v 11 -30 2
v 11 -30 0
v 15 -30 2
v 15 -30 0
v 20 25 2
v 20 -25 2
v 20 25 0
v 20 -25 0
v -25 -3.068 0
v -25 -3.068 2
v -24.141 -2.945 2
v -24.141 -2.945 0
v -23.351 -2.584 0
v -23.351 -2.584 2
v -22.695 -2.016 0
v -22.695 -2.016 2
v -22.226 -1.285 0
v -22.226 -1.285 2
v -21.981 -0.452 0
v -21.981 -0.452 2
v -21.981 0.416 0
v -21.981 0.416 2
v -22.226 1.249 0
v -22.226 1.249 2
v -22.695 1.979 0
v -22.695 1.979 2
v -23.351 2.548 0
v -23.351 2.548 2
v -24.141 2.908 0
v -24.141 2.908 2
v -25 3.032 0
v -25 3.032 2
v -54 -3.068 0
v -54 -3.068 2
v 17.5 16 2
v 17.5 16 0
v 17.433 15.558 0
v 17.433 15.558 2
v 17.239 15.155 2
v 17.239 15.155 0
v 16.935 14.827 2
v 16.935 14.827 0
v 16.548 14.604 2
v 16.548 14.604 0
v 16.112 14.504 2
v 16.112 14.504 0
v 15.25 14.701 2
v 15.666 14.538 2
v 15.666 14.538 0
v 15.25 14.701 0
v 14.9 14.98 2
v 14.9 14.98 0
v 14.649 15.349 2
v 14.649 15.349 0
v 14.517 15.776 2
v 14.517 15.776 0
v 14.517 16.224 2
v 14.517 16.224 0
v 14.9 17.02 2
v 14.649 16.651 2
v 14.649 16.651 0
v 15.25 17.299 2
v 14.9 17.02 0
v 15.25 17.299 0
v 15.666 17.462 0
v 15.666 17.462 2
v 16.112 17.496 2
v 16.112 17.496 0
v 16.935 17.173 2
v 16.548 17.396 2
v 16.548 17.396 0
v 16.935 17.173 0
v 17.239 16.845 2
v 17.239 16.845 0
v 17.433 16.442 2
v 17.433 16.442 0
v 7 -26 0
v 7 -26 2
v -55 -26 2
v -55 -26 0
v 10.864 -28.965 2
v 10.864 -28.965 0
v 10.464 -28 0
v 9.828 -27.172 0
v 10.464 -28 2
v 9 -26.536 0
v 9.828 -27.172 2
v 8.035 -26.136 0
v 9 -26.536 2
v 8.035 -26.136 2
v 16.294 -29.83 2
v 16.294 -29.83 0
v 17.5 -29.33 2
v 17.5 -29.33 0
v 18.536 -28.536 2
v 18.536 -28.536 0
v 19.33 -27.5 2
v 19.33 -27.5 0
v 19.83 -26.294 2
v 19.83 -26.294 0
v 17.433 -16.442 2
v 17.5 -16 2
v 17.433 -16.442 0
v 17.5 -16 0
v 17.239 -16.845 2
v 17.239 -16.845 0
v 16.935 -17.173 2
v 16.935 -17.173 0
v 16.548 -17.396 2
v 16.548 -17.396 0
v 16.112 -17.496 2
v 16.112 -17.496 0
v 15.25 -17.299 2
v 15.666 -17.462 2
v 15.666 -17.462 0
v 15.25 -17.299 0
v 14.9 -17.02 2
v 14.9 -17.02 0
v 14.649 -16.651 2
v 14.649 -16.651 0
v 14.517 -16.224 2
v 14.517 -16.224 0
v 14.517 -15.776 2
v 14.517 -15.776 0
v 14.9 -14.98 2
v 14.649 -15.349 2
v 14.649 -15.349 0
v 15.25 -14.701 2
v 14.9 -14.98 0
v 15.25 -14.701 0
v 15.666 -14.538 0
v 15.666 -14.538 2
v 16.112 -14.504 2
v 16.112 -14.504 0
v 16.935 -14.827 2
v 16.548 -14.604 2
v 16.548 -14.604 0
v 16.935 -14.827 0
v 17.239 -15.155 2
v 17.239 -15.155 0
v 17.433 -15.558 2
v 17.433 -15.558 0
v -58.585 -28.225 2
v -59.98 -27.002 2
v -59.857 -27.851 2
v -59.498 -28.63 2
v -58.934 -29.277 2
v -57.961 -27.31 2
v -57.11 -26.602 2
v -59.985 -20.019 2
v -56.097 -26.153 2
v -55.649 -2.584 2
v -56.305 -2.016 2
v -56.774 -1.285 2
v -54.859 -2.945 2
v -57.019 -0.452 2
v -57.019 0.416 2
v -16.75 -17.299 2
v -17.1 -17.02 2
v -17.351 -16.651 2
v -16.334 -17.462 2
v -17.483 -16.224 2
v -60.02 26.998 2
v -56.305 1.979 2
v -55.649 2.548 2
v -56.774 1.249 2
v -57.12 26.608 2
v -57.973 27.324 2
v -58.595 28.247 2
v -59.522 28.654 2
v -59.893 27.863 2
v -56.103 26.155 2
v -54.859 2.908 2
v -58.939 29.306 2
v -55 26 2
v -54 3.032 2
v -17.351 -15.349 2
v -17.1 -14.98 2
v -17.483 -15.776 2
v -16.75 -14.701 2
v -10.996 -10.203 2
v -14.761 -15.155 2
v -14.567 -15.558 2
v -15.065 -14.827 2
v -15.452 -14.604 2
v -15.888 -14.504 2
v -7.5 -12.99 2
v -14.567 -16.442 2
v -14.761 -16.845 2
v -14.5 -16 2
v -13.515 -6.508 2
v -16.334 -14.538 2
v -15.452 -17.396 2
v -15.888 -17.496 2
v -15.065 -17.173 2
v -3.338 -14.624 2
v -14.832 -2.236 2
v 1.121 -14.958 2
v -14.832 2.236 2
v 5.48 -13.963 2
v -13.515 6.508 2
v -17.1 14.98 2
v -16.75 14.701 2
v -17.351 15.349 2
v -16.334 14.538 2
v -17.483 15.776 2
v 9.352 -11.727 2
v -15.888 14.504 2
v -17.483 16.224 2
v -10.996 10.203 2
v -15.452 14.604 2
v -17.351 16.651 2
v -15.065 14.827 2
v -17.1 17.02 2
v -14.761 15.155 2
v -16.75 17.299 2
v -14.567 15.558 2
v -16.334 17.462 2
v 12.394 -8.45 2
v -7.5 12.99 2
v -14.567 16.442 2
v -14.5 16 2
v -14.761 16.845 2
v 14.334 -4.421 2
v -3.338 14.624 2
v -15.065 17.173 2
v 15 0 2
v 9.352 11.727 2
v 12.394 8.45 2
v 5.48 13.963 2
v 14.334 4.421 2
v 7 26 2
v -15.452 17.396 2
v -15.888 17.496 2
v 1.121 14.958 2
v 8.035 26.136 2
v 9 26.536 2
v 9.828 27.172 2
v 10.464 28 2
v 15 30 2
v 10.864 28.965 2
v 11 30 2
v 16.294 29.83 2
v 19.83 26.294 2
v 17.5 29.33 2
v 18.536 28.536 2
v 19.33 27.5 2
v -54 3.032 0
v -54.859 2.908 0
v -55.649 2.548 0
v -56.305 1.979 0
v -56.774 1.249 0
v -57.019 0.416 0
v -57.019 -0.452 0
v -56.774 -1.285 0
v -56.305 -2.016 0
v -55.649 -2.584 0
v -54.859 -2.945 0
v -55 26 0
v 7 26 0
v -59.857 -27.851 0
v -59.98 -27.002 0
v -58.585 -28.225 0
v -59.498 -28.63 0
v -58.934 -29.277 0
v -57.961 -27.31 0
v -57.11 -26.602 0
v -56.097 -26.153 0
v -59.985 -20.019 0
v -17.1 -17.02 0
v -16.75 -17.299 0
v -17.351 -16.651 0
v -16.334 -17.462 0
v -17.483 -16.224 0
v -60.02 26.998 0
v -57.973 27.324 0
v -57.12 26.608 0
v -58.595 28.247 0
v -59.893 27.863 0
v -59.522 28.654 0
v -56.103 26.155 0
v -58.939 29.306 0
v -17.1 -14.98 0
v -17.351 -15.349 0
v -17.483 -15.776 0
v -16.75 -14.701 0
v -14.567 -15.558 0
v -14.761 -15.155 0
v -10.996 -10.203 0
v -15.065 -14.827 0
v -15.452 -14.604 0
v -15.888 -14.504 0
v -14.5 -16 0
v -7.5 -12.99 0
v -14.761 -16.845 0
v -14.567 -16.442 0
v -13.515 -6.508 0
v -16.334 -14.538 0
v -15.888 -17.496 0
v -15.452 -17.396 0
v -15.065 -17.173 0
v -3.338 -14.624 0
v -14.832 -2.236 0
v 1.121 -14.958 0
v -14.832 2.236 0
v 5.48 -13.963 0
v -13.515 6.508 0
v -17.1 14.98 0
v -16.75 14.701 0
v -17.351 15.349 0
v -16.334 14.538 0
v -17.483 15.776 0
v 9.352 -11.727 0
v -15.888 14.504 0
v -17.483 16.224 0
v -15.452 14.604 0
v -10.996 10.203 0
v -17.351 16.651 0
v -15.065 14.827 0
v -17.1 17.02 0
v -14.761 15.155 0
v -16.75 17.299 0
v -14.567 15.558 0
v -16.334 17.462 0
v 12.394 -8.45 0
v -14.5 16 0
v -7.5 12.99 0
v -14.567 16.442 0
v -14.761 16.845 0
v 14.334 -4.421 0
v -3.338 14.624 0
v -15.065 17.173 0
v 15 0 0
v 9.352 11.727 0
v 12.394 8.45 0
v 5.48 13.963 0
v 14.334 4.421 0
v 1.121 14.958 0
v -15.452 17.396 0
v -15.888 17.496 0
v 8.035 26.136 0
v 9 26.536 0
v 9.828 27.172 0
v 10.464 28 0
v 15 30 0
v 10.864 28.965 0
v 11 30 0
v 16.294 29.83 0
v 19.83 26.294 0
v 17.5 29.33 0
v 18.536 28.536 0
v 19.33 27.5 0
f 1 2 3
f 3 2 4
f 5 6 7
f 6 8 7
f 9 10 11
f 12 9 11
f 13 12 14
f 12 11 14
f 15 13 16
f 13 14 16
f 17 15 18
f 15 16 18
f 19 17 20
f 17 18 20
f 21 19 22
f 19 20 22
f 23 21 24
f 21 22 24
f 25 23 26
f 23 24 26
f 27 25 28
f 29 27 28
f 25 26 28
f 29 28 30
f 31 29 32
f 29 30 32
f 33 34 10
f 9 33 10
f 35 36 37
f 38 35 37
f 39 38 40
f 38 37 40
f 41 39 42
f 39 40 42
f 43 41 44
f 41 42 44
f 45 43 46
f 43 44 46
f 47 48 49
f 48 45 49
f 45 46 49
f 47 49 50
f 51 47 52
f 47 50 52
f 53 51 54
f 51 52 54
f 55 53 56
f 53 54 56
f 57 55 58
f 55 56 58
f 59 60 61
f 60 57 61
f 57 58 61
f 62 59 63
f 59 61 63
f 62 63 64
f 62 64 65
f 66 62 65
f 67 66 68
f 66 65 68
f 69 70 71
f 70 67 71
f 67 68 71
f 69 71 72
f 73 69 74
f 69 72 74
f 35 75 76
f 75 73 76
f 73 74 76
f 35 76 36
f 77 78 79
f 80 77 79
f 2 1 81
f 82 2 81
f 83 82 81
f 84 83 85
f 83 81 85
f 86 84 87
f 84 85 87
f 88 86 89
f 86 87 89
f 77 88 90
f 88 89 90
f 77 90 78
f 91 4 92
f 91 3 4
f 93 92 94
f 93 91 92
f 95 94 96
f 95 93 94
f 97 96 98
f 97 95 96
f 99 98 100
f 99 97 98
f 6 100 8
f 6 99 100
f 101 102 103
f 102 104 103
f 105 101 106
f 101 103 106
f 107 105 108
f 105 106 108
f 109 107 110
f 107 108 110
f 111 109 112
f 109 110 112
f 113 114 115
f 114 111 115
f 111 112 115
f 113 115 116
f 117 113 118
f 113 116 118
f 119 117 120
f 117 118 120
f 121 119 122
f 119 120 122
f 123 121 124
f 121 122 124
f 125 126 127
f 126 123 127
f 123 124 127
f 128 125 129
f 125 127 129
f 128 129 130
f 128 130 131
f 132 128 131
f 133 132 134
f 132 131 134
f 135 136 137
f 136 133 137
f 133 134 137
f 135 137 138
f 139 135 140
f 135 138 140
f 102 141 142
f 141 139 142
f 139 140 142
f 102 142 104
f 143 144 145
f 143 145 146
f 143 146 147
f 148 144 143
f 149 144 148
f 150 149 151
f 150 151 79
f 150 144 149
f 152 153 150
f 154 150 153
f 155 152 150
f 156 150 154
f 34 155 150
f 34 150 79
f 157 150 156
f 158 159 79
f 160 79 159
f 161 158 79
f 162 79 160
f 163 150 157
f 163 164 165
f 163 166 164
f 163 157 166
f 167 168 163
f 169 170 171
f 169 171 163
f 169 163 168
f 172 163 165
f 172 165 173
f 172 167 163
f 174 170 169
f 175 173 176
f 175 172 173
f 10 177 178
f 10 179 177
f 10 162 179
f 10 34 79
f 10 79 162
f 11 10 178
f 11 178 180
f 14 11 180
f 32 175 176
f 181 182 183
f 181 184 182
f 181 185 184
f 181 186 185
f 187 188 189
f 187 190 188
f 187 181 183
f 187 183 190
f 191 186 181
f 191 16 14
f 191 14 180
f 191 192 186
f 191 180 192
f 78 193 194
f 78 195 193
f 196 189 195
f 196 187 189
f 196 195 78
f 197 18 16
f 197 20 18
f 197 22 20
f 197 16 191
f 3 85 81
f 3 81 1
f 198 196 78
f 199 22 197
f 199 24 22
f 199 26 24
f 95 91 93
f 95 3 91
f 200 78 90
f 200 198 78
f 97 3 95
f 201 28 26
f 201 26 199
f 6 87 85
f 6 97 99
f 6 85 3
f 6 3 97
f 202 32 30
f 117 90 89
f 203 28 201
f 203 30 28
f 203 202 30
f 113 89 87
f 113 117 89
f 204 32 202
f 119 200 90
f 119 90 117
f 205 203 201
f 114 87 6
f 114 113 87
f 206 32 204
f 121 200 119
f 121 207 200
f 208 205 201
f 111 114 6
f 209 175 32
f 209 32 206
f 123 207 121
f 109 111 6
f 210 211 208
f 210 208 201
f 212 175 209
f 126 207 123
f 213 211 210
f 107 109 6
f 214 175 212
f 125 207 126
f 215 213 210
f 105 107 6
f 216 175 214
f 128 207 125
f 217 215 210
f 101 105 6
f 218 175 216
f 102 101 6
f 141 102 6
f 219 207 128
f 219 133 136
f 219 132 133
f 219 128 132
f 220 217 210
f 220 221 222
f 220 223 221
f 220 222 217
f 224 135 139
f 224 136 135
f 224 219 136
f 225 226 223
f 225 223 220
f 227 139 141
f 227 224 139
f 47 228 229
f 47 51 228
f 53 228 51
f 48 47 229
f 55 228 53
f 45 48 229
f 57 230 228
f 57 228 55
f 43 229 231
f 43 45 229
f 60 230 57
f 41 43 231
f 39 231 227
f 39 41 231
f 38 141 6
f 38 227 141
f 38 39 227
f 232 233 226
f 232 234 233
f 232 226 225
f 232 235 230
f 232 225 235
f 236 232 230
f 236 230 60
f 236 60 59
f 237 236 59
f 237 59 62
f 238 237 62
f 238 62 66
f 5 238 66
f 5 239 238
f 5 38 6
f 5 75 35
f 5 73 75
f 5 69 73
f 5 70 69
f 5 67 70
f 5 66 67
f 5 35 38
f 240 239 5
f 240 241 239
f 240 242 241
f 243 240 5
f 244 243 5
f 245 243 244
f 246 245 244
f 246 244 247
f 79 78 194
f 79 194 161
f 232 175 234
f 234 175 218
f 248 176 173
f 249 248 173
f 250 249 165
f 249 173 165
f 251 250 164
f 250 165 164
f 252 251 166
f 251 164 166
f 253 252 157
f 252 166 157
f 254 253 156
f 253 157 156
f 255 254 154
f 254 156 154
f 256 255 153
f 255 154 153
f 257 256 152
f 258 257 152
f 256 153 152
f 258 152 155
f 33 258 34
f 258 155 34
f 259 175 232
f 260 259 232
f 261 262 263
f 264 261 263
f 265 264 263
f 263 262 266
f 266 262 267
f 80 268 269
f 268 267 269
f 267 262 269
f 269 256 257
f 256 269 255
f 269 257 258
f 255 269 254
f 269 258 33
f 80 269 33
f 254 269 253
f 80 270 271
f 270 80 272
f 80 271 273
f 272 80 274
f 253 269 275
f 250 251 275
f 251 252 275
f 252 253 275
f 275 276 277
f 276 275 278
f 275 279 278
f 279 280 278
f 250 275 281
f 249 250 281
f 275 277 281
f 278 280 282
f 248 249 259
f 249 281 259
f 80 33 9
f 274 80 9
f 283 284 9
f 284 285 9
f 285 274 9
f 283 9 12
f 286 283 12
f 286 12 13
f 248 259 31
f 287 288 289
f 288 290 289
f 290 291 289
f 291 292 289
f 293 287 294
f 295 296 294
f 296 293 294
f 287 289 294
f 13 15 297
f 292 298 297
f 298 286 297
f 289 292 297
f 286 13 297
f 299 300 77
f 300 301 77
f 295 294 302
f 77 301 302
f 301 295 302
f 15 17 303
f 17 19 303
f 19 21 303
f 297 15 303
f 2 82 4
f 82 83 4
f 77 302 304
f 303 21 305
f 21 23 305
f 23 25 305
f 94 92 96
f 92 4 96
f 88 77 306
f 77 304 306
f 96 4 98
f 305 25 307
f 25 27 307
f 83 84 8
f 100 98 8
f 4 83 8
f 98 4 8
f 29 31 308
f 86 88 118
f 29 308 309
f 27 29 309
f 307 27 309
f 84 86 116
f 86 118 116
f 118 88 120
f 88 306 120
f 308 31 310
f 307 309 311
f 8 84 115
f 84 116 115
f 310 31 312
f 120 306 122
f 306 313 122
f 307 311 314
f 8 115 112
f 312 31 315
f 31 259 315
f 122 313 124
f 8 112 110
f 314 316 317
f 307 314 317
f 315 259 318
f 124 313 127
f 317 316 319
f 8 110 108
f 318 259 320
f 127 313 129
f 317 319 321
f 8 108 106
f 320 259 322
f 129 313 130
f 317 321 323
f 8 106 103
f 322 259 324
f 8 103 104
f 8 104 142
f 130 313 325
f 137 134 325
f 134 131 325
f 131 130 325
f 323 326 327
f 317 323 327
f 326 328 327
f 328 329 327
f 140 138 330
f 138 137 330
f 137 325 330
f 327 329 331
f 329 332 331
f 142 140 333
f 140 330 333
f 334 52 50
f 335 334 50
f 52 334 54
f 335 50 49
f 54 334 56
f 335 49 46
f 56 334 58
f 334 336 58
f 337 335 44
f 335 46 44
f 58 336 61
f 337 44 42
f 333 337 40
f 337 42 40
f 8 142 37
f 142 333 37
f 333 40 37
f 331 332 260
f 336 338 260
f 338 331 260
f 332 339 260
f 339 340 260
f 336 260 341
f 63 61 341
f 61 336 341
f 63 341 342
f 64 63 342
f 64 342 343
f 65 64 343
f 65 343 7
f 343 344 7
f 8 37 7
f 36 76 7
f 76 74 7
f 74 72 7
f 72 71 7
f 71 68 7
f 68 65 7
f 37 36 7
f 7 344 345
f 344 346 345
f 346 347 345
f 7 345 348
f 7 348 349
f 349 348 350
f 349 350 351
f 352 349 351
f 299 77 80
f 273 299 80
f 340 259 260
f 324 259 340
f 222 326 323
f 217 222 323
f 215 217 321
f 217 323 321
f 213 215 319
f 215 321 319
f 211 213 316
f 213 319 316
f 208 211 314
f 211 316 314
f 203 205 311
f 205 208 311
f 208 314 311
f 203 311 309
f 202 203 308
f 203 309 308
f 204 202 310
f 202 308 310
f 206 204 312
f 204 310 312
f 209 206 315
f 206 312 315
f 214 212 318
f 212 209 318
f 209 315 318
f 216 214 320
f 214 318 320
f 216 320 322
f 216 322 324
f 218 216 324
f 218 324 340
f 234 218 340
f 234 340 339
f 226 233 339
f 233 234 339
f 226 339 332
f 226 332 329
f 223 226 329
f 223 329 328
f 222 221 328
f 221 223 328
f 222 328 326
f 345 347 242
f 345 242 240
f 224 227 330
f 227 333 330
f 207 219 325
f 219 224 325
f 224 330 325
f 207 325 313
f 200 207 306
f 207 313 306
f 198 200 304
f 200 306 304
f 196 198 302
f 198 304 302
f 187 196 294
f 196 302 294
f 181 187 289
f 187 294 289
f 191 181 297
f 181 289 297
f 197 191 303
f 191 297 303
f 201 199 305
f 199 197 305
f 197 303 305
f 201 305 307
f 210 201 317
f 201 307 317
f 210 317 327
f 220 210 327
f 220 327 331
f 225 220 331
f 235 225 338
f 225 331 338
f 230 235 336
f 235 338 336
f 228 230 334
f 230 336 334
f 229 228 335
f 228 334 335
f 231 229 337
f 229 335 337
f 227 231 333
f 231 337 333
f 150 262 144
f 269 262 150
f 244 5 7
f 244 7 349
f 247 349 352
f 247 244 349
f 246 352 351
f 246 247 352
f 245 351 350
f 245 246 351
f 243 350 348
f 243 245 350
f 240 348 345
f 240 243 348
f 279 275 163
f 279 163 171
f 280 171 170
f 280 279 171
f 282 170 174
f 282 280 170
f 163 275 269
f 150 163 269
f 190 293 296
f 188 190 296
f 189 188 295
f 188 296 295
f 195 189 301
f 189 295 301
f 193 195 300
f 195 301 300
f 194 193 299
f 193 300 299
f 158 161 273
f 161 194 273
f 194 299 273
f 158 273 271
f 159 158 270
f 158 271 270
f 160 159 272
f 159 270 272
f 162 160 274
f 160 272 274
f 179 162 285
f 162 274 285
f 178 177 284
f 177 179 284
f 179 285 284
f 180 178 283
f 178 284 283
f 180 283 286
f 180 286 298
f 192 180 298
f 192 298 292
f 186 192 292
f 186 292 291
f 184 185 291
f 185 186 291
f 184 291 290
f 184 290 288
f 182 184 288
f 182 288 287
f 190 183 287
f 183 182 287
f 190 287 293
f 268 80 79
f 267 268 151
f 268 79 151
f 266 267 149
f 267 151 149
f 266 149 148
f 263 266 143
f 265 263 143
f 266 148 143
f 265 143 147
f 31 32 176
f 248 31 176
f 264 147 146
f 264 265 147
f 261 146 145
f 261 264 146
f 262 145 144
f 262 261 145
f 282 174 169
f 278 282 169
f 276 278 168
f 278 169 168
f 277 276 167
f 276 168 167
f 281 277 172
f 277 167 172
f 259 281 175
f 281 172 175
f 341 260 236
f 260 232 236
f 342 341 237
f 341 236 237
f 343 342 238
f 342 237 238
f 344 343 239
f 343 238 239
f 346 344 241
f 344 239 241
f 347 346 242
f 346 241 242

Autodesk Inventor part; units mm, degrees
ref_plane "YZ Plane" through (0, 0, 0) normal (1, 0, 0) x (0, 1, 0)
ref_plane "XZ Plane" through (0, 0, 0) normal (0, 1, 0) x (-1, 0, 0)
ref_plane "XY Plane" through (0, 0, 0) normal (0, 0, 1) x (1, 0, 0)
sketch "Sketch1" plane through (0, 0, 0) normal (0, 0, 1) x (1, 0, 0)
  circle A0 centre (0, 0) radius 15 projected
  circle A1 centre (16, 16) radius 1.5 projected
  circle A2 centre (-16, 16) radius 1.5 projected
  circle A3 centre (-16, -16) radius 1.5 projected
  circle A4 centre (16, -16) radius 1.5 projected
  line L0 (20, -18) -> (20, 18) projected
  line L1 (18, 20) -> (-18, 20) projected
  line L2 (-60.0198, 26.9978) -> (-59.9853, -20.0189)
  line L3 (-18, -20) -> (18, -20) projected
  line L4 (-57.0198, 30) -> (-15.022, 30)
  line L5 (-14.978, -30) -> (-56.9802, -30)
  line L6 (-59.9802, -27.0022) -> (-60.0198, 26.9978)
  arc A5 (-59.9802, -27.0022) -> (-56.9802, -30) centre (-56.9802, -27) ccw
  arc A6 (-57.0198, 30) -> (-60.0198, 26.9978) centre (-57.0198, 27) ccw
  line L7 (20, -18) -> (20, 18)
  line L8 (-14.978, -30) -> (20, -30)
  line L9 (20, -30) -> (20, -18)
  line L10 (20, -30) -> (-56.9802, -30)
  line L11 (-60.0198, -29) -> (-60.0198, 27)
  line L12 (-57.0198, 30) -> (20, 30)
  line L13 (20, 30) -> (20, -30)
  point P0 (0, 0)
  point P1 (-60.0198, 26.9811)
  point P2 (-59.978, -30)
  dimension "d16" = 3
  dimension "d17" = 3
  dimension "d26" = 30
  dimension "d27" = 60
  dimension "d29" = 45
  dimension "d30" = 45
  dimension "d31" = 60
  dimension "d32" = 79.9853
  dimension "d33" = 80.0198
extrude "Extrusion1" add sketch "Sketch1" along normal blind 2
fillet "Fillet1" radius 5 2 edges at (20, -30, 1) (20, 30, 1)
sketch "Sketch4" plane through (0, 0, 2) normal (0, 0, 1) x (1, 0, 0)
  line L0 (-21.95, -0.0183) -> (-57.05, -0.0183) construction
  line L1 (-25, 3.0317) -> (-54, 3.0317)
  line L2 (-54, -3.0683) -> (-25, -3.0683)
  arc A0 (-25, -3.0683) -> (-25, 3.0317) centre (-25, -0.0183) ccw
  arc A1 (-54, 3.0317) -> (-54, -3.0683) centre (-54, -0.0183) ccw
  circle A2 centre (0, 0) radius 15 projected
  line L3 (-60.0198, 26.9978) -> (-59.9802, -27.0022) projected
  point P0 (0, 0)
  point P1 (-39.5, -0.0183)
  dimension "d34" = 6.1
  dimension "d35" = 25
  dimension "d36" = 6
extrude "Extrusion2" cut sketch "Sketch4" against normal through all contours A0 L2 A1 L1
sketch "Sketch5" plane through (0, 0, 2) normal (0, 0, 1) x (1, 0, 0)
  point P0 (0, 0)
sketch "Sketch6" plane through (0, 0, 2) normal (0, 0, 1) x (1, 0, 0)
  line L0 (15, 30) -> (-57.0198, 30) projected
  line L1 (7, 30) -> (-55, 30) construction
  line L2 (7, 34) -> (-55, 34)
  line L3 (-55, 26) -> (7, 26)
  arc A0 (7, 26) -> (7, 34) centre (7, 30) ccw
  arc A1 (-55, 34) -> (-55, 26) centre (-55, 30) ccw
  point P0 (0, 0)
  point P1 (-24, 30)
  dimension "d39" = 62
extrude "Extrusion3" cut sketch "Sketch6" against normal through all
ref_plane "Work Plane1" through (15, 0, 2) normal (0, 1, 0) x (1, 0, 0)
mirror "Mirror1" about plane through (15, 0, 2) normal (0, 1, 0) of "Extrusion3"
equation "\"d26\" = 0.5 * d27"
equation "\"d30\" = d29"
properties part number "X-motor-holder"
